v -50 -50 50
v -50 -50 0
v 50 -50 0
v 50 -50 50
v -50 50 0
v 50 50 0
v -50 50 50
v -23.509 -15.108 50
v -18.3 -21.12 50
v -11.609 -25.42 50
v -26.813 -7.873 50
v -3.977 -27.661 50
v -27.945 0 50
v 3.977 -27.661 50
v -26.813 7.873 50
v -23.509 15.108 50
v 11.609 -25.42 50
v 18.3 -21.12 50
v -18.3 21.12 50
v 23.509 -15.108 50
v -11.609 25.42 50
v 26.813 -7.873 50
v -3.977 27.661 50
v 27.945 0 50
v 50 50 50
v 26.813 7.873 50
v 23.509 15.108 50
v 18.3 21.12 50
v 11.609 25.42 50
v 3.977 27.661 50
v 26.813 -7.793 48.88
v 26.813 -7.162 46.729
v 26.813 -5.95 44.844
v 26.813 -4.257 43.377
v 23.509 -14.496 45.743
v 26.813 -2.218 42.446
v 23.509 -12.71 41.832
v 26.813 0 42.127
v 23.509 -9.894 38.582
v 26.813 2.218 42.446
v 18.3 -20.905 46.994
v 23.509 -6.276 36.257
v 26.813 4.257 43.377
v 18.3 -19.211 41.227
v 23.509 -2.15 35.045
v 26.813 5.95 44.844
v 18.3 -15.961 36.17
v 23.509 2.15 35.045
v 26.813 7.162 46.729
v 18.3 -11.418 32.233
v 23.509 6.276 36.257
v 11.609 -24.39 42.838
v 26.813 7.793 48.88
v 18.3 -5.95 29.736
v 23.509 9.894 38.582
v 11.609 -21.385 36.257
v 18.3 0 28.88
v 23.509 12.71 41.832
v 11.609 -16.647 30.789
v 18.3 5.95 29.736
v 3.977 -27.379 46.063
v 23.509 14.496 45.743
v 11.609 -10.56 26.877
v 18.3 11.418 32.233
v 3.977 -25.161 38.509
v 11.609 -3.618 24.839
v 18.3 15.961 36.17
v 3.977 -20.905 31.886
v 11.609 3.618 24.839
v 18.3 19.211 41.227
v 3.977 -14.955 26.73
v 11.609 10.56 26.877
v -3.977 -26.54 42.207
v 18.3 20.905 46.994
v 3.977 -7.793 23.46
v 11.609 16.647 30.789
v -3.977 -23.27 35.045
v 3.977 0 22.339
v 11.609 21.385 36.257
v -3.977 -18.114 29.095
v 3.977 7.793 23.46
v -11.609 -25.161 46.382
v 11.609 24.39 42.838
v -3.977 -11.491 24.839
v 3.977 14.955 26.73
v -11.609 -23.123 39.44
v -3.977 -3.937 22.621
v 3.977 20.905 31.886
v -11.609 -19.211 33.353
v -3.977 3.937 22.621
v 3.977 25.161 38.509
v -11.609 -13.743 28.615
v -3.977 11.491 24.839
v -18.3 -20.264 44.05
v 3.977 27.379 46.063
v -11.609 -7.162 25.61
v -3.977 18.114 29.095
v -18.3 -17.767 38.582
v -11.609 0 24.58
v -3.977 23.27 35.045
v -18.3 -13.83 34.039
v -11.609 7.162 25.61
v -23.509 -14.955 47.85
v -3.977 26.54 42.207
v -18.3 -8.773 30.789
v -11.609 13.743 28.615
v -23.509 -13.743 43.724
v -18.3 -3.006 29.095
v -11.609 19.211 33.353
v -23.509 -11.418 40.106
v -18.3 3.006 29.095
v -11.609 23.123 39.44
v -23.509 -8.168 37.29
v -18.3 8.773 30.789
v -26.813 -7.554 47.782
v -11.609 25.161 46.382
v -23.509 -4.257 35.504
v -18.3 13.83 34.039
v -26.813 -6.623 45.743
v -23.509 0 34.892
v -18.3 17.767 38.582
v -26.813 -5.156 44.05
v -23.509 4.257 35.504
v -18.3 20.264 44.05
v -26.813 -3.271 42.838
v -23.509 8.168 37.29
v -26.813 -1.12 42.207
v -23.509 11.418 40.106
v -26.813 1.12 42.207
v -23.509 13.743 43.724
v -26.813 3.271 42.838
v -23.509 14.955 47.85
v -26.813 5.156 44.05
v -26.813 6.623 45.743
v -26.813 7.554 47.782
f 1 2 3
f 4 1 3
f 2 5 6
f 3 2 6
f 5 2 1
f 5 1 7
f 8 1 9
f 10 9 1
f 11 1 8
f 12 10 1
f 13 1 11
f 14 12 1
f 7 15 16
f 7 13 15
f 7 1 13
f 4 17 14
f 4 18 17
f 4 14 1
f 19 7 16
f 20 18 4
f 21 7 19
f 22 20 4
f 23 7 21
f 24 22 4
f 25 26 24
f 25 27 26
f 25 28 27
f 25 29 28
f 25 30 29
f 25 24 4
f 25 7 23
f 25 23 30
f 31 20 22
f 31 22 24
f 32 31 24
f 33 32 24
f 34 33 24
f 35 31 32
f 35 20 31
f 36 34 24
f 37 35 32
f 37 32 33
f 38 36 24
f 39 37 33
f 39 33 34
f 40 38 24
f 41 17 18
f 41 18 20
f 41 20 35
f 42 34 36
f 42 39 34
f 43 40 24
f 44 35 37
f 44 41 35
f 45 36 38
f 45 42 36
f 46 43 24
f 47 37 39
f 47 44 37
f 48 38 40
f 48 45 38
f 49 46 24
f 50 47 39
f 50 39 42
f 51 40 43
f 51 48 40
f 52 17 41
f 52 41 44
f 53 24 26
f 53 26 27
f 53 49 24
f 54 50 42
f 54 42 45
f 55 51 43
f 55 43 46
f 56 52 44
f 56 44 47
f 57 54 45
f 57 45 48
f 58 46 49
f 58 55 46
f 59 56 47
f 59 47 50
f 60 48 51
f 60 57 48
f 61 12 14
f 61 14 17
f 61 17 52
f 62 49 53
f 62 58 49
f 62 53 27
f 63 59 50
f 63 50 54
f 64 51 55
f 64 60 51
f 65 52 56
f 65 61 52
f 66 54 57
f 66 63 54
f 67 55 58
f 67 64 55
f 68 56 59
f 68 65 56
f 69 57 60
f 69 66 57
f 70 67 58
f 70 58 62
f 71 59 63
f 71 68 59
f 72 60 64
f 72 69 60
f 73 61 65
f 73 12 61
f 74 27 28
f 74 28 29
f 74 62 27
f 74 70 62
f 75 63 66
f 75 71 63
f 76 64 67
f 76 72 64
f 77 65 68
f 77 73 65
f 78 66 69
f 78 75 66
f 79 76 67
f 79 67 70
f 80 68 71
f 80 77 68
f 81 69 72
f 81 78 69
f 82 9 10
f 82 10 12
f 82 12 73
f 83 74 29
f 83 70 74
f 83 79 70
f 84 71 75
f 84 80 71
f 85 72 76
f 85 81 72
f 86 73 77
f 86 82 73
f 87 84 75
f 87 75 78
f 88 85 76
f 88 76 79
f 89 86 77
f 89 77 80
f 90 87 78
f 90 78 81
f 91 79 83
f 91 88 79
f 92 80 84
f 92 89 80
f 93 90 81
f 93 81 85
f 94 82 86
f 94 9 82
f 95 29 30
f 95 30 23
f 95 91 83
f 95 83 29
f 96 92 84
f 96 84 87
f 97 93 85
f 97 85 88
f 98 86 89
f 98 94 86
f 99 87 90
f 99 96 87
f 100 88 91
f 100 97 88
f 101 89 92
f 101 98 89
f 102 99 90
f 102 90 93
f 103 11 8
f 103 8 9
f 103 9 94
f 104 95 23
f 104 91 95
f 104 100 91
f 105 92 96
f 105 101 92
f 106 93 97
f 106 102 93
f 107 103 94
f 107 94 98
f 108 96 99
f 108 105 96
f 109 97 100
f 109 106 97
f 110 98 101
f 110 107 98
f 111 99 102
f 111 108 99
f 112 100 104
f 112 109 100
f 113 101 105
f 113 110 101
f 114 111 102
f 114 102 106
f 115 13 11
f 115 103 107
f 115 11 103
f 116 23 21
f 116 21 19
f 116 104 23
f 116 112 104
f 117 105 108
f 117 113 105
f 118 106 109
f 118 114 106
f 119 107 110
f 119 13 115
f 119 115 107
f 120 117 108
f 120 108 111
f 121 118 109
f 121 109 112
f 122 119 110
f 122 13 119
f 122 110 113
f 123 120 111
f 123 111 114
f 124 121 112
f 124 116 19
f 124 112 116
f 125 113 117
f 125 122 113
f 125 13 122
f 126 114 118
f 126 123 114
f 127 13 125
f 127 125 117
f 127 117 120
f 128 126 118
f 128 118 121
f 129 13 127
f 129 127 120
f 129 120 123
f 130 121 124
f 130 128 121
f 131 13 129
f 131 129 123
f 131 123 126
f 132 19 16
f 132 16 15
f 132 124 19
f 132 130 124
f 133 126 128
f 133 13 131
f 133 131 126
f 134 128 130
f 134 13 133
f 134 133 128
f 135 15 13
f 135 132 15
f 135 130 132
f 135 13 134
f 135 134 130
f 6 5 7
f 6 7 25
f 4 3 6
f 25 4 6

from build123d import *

# Parameters (mm, degrees)
ESBO_O1_W       = 100
ESBO_O1_H       = 100
EXTRUS_O1_DEPTH = 50


with BuildPart() as part:
    # Esboço1 → Extrusão1 (new body)
    with BuildSketch(Plane.XY):
        Rectangle(ESBO_O1_W, ESBO_O1_H)
    extrude(amount=EXTRUS_O1_DEPTH)

    # Esboço2 → Corte-Revolução1 (revolve, cut)
    with BuildSketch(Plane.XY.offset(50)):
        with BuildLine():
            Line((-27.945356346, 0), (27.945356346, 0))
            ThreePointArc((27.945356346, 0), (0, 27.945356346), (-27.945356346, 0))
        make_face()
    revolve(axis=Axis((-27.945356346, 0, 50), (1, 0, 0)), mode=Mode.SUBTRACT)


solid = part.part
